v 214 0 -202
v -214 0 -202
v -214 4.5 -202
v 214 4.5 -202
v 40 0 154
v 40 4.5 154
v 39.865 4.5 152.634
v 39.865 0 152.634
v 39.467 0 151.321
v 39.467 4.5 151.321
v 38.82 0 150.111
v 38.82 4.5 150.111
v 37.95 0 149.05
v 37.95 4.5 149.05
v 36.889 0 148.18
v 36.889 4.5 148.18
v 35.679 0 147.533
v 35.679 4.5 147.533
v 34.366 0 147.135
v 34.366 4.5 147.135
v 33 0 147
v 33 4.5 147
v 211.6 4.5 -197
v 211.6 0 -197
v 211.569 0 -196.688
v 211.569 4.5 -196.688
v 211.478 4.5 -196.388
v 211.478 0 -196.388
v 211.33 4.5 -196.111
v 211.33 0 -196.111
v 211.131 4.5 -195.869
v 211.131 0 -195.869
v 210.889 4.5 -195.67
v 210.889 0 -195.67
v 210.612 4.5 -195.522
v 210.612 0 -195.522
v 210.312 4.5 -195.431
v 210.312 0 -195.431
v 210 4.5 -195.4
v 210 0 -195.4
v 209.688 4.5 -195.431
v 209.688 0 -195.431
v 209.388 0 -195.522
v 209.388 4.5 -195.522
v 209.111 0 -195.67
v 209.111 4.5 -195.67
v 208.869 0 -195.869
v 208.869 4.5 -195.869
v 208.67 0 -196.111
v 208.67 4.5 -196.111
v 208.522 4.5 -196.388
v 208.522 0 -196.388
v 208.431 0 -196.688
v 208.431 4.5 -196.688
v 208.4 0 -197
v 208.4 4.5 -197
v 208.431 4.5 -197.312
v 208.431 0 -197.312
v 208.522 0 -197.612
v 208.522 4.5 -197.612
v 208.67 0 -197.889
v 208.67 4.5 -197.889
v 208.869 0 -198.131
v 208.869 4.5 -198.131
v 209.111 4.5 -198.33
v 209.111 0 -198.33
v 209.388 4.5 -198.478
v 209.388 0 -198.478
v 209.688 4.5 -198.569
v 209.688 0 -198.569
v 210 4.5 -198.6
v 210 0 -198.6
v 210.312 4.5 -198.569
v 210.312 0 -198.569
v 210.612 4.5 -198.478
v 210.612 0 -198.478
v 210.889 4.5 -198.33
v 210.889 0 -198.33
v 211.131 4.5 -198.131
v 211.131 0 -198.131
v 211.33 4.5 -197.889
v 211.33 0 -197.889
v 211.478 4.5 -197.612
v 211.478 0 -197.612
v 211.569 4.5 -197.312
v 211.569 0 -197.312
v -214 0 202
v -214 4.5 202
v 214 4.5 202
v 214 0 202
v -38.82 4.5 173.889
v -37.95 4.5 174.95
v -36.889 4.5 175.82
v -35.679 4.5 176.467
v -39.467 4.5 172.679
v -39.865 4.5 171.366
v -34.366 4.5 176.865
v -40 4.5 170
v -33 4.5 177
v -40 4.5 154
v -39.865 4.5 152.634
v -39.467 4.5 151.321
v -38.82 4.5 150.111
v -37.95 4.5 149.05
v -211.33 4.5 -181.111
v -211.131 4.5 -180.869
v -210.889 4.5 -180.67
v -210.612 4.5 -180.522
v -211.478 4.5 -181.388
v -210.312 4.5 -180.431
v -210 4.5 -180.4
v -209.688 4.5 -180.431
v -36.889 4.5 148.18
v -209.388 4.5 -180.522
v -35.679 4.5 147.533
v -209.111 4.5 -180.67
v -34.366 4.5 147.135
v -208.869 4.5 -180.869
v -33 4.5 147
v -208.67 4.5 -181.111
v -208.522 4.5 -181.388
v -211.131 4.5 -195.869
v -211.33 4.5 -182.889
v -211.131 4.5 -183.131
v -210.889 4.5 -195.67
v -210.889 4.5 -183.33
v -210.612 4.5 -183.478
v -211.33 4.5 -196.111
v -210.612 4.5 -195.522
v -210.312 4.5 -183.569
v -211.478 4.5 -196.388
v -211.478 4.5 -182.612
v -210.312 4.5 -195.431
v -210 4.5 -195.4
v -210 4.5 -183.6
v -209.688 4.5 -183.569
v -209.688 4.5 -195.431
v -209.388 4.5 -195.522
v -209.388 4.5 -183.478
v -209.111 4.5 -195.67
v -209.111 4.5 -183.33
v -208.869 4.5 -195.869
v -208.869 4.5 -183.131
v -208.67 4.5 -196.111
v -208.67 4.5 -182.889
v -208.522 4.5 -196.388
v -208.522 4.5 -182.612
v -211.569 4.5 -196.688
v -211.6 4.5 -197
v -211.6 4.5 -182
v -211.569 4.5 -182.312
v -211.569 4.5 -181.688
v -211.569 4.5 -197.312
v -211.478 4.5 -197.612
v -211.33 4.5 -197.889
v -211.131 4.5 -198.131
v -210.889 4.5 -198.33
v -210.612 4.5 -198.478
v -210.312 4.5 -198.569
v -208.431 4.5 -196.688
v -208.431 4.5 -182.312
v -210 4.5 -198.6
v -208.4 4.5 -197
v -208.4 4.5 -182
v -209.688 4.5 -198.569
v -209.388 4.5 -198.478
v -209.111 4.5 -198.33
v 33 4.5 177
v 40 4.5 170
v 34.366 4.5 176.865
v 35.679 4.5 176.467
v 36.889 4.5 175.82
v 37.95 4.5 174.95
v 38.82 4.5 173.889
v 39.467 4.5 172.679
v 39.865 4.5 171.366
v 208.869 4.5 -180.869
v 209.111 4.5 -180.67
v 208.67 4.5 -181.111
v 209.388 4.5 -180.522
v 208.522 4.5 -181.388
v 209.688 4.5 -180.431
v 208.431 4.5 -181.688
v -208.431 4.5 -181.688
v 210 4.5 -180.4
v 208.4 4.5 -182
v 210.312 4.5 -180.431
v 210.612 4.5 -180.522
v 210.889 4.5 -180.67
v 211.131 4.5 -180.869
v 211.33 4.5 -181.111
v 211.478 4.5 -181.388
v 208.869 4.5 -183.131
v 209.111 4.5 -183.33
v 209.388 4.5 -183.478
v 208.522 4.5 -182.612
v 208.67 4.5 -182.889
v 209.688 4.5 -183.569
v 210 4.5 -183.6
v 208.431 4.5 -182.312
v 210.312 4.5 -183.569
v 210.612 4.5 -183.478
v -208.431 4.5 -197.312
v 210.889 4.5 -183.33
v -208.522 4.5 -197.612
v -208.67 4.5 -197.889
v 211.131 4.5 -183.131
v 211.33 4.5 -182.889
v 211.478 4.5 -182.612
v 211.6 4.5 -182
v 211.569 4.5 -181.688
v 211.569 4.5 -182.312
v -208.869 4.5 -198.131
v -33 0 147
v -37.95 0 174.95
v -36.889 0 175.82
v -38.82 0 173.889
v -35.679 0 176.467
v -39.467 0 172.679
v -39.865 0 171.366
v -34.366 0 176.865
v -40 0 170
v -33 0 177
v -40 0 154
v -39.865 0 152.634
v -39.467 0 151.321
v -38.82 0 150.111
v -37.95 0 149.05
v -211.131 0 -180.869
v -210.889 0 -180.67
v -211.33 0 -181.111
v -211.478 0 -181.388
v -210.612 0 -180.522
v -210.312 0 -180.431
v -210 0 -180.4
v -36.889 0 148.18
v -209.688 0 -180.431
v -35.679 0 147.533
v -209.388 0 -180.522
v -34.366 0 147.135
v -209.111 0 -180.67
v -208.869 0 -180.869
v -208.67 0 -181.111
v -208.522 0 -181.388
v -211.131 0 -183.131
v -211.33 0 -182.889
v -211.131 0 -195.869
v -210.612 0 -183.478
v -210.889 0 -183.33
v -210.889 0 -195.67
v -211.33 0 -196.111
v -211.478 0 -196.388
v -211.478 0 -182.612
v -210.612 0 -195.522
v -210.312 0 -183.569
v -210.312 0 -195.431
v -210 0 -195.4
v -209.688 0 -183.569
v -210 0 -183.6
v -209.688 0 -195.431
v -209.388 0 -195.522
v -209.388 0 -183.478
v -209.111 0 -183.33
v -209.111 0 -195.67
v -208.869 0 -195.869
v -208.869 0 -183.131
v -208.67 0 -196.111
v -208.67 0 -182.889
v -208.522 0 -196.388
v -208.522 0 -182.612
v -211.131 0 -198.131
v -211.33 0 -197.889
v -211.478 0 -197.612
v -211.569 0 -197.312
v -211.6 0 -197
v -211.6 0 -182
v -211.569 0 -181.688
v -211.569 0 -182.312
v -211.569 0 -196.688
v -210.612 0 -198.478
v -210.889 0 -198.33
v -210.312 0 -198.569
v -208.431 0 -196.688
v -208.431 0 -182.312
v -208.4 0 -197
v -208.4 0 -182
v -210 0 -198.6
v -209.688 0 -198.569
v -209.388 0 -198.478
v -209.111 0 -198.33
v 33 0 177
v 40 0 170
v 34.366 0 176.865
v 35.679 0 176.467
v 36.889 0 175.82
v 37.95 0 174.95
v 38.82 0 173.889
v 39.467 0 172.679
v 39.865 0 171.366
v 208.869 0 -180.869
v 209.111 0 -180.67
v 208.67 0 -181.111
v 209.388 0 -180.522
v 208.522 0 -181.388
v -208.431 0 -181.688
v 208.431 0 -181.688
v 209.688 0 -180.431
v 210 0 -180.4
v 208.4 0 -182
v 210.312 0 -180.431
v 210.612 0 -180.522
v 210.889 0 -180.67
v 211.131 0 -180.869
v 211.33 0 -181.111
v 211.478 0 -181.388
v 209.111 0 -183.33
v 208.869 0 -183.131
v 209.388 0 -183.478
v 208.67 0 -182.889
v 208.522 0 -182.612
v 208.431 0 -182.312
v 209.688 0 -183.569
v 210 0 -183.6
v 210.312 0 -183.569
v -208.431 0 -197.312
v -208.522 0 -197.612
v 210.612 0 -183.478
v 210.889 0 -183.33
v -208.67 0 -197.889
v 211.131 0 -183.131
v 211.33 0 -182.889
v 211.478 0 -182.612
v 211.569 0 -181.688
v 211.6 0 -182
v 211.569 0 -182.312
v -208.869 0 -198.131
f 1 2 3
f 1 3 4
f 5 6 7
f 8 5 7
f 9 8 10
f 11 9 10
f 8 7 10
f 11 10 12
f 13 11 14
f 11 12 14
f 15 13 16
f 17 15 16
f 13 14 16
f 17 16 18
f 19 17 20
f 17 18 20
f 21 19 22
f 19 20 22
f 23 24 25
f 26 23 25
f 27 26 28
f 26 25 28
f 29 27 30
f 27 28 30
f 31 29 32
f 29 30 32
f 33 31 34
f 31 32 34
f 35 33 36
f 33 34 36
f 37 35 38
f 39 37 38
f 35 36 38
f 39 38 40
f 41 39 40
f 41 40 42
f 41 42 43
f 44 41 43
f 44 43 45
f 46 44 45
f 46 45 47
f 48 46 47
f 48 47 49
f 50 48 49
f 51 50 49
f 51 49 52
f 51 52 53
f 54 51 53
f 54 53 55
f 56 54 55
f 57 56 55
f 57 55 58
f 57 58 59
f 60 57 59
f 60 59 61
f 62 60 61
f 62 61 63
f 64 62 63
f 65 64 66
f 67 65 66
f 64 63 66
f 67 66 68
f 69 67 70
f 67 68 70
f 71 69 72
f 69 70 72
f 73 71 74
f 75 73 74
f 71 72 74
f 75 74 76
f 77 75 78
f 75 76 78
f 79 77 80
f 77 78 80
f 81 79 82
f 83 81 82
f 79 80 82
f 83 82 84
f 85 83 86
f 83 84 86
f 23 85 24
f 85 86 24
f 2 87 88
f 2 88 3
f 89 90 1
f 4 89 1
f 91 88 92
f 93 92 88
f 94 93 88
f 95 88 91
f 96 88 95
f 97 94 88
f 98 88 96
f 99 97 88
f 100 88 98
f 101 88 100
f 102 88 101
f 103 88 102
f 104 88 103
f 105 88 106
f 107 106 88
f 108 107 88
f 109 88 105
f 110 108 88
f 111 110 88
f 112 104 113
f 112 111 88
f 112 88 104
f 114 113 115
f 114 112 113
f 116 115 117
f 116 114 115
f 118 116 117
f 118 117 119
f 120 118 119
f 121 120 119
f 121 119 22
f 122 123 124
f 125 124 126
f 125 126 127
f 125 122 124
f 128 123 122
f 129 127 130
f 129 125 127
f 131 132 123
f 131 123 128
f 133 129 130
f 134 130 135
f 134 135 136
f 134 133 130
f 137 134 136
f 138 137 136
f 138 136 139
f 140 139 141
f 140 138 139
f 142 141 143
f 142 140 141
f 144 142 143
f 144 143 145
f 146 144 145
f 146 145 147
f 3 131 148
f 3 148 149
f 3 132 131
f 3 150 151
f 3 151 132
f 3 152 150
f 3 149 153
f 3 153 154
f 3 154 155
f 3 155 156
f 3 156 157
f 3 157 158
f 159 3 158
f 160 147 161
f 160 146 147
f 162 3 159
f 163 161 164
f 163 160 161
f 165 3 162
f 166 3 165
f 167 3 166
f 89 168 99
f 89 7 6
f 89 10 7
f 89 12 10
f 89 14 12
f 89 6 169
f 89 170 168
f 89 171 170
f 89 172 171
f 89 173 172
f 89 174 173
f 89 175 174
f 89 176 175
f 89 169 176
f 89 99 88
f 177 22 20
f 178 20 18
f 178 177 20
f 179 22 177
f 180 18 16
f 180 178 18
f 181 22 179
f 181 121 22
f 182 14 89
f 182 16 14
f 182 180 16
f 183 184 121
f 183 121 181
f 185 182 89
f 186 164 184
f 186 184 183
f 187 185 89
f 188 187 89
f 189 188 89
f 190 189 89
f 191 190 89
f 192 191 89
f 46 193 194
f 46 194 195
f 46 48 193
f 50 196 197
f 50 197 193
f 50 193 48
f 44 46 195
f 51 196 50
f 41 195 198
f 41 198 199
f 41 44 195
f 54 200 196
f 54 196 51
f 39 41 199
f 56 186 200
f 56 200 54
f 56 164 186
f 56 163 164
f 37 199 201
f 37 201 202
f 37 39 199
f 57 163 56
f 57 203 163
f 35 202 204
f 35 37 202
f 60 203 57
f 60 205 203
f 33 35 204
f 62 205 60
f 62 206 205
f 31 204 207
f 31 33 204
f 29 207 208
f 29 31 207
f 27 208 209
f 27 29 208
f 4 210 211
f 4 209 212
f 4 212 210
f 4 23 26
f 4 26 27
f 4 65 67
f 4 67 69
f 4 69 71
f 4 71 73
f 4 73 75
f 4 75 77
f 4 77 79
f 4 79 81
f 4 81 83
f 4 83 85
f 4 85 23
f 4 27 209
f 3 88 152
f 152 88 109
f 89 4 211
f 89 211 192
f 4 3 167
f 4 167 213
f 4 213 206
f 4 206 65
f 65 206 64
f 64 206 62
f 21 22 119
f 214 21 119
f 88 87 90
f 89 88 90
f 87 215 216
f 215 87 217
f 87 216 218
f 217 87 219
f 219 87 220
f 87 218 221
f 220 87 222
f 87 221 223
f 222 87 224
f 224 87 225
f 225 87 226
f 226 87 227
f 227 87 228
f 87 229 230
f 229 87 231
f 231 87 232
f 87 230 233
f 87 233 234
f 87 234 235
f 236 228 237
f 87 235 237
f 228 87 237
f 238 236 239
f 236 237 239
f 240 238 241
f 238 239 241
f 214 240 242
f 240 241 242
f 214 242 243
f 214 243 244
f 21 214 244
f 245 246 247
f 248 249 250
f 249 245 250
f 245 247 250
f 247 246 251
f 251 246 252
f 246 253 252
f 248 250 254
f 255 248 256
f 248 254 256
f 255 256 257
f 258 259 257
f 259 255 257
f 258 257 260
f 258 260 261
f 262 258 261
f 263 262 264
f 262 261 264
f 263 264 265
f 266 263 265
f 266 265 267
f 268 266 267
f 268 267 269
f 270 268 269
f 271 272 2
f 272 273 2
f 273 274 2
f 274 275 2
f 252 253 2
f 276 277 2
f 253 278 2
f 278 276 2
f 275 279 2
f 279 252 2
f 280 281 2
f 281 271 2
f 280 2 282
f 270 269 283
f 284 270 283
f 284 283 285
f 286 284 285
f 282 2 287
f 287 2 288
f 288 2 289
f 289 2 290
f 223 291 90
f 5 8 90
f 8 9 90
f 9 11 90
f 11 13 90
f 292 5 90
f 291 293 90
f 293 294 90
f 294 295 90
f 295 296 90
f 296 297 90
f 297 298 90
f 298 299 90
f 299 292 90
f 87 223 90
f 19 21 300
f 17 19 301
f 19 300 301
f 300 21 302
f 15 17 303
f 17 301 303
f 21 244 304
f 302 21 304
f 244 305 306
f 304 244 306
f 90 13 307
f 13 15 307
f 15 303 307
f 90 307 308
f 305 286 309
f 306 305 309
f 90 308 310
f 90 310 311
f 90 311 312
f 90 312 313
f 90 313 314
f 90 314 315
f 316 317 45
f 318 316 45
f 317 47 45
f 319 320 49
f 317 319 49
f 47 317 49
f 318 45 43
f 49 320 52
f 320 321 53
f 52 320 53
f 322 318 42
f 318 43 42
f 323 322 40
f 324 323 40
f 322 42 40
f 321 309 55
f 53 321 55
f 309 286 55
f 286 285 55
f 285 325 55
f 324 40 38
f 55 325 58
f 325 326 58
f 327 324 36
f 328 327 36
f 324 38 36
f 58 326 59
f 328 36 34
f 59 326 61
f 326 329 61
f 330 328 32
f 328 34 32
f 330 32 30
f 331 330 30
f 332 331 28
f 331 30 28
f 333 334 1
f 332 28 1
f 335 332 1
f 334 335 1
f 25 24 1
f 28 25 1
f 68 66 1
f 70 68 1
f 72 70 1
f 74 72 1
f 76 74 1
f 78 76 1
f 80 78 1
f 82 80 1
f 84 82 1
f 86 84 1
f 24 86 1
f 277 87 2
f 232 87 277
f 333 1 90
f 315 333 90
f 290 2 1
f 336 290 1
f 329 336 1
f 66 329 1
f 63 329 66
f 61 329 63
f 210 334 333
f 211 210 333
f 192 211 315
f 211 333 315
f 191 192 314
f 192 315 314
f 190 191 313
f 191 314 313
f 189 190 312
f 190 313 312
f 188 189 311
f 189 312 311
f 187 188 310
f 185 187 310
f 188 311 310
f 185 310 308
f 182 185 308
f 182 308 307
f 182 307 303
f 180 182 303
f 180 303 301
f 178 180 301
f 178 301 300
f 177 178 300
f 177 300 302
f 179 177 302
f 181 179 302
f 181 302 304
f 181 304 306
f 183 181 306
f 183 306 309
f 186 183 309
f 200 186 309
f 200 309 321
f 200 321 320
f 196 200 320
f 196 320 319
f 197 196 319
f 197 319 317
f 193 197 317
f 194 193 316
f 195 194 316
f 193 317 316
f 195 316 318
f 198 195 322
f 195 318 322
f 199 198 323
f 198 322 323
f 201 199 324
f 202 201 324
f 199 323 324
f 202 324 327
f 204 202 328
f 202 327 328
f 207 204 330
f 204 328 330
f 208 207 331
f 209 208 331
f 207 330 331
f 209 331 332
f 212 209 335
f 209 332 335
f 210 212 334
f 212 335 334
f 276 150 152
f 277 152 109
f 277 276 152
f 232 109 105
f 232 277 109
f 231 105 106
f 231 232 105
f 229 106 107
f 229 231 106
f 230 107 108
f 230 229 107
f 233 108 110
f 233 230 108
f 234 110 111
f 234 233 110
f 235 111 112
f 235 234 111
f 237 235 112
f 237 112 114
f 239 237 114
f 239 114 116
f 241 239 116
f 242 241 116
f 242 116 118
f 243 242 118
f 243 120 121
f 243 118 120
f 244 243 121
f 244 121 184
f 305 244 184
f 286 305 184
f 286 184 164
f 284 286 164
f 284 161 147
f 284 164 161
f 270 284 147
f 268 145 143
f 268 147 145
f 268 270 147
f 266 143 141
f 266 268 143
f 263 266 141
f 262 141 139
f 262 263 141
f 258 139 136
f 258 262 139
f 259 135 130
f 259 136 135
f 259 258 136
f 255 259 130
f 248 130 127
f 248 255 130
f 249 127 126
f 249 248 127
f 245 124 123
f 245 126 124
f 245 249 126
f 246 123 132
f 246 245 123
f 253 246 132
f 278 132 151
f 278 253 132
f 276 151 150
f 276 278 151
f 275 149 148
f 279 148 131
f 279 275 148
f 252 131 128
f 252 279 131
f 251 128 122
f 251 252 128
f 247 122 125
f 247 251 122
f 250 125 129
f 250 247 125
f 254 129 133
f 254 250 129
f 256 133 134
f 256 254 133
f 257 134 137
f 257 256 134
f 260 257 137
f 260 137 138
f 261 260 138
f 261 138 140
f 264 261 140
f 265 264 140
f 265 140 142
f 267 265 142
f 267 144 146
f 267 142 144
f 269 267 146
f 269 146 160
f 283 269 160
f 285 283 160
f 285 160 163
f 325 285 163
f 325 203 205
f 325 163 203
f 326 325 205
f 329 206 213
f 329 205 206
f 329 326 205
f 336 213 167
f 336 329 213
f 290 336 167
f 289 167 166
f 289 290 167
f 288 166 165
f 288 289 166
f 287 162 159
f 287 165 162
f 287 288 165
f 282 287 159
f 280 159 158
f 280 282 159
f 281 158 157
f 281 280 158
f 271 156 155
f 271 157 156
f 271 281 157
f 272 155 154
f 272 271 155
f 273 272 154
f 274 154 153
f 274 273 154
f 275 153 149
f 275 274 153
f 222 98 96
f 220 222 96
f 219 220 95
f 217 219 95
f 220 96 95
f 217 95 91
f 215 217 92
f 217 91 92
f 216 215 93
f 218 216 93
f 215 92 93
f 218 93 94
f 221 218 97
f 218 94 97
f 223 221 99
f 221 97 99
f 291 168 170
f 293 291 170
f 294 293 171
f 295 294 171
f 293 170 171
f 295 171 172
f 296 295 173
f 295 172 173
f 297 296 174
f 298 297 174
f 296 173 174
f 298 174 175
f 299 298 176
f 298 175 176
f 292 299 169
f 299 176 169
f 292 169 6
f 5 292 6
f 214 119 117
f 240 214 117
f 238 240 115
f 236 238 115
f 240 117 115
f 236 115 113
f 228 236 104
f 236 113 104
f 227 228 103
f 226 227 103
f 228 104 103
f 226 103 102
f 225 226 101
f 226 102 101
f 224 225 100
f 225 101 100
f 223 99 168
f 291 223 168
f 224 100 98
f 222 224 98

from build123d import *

# Parameters (mm, degrees)
SKETCH1_W           = 428
SKETCH1_H           = 404
BOSS_EXTRUDE1_DEPTH = 4.5
SKETCH2_R           = 1.6
CUT_EXTRUDE1_DEPTH  = 5.5
CUT_EXTRUDE2_DEPTH  = 5.5


with BuildPart() as part:
    # Sketch1 → Boss-Extrude1 (new body)
    with BuildSketch(Plane(origin=(0, 0, 0), x_dir=(1, 0, 0), z_dir=(0, 1, 0))):
        Rectangle(SKETCH1_W, SKETCH1_H)
    extrude(amount=BOSS_EXTRUDE1_DEPTH)

    # Sketch2 → Cut-Extrude1 (cut, through all)
    with BuildSketch(Plane.XZ):
        with Locations((210, -182)):
            Circle(SKETCH2_R)
        with Locations((210, -197)):
            Circle(SKETCH2_R)
    cut_extrude1 = extrude(amount=-CUT_EXTRUDE1_DEPTH, mode=Mode.SUBTRACT)

    # Mirror1: Cut-Extrude1 across plane
    add(cut_extrude1.mirror(Plane(origin=(0, 0, 0), x_dir=(0, 0, 1), z_dir=(1, 0, 0))), mode=Mode.SUBTRACT)

    # Sketch3 → Cut-Extrude2 (cut, through all)
    with BuildSketch(Plane(origin=(0, 4.5, 0), x_dir=(1, 0, 0), z_dir=(0, 1, 0))):
        with BuildLine():
            Line((-33, -177), (33, -177))
            ThreePointArc((33, -177), (37.949747468, -174.949747468), (40, -170))
            Line((40, -170), (40, -154))
            ThreePointArc((40, -154), (37.949747468, -149.050252532), (33, -147))
            Line((33, -147), (-33, -147))
            ThreePointArc((-33, -147), (-37.949747468, -149.050252532), (-40, -154))
            Line((-40, -154), (-40, -170))
            ThreePointArc((-40, -170), (-37.949747468, -174.949747468), (-33, -177))
        make_face()
    extrude(amount=-CUT_EXTRUDE2_DEPTH, mode=Mode.SUBTRACT)


solid = part.part
